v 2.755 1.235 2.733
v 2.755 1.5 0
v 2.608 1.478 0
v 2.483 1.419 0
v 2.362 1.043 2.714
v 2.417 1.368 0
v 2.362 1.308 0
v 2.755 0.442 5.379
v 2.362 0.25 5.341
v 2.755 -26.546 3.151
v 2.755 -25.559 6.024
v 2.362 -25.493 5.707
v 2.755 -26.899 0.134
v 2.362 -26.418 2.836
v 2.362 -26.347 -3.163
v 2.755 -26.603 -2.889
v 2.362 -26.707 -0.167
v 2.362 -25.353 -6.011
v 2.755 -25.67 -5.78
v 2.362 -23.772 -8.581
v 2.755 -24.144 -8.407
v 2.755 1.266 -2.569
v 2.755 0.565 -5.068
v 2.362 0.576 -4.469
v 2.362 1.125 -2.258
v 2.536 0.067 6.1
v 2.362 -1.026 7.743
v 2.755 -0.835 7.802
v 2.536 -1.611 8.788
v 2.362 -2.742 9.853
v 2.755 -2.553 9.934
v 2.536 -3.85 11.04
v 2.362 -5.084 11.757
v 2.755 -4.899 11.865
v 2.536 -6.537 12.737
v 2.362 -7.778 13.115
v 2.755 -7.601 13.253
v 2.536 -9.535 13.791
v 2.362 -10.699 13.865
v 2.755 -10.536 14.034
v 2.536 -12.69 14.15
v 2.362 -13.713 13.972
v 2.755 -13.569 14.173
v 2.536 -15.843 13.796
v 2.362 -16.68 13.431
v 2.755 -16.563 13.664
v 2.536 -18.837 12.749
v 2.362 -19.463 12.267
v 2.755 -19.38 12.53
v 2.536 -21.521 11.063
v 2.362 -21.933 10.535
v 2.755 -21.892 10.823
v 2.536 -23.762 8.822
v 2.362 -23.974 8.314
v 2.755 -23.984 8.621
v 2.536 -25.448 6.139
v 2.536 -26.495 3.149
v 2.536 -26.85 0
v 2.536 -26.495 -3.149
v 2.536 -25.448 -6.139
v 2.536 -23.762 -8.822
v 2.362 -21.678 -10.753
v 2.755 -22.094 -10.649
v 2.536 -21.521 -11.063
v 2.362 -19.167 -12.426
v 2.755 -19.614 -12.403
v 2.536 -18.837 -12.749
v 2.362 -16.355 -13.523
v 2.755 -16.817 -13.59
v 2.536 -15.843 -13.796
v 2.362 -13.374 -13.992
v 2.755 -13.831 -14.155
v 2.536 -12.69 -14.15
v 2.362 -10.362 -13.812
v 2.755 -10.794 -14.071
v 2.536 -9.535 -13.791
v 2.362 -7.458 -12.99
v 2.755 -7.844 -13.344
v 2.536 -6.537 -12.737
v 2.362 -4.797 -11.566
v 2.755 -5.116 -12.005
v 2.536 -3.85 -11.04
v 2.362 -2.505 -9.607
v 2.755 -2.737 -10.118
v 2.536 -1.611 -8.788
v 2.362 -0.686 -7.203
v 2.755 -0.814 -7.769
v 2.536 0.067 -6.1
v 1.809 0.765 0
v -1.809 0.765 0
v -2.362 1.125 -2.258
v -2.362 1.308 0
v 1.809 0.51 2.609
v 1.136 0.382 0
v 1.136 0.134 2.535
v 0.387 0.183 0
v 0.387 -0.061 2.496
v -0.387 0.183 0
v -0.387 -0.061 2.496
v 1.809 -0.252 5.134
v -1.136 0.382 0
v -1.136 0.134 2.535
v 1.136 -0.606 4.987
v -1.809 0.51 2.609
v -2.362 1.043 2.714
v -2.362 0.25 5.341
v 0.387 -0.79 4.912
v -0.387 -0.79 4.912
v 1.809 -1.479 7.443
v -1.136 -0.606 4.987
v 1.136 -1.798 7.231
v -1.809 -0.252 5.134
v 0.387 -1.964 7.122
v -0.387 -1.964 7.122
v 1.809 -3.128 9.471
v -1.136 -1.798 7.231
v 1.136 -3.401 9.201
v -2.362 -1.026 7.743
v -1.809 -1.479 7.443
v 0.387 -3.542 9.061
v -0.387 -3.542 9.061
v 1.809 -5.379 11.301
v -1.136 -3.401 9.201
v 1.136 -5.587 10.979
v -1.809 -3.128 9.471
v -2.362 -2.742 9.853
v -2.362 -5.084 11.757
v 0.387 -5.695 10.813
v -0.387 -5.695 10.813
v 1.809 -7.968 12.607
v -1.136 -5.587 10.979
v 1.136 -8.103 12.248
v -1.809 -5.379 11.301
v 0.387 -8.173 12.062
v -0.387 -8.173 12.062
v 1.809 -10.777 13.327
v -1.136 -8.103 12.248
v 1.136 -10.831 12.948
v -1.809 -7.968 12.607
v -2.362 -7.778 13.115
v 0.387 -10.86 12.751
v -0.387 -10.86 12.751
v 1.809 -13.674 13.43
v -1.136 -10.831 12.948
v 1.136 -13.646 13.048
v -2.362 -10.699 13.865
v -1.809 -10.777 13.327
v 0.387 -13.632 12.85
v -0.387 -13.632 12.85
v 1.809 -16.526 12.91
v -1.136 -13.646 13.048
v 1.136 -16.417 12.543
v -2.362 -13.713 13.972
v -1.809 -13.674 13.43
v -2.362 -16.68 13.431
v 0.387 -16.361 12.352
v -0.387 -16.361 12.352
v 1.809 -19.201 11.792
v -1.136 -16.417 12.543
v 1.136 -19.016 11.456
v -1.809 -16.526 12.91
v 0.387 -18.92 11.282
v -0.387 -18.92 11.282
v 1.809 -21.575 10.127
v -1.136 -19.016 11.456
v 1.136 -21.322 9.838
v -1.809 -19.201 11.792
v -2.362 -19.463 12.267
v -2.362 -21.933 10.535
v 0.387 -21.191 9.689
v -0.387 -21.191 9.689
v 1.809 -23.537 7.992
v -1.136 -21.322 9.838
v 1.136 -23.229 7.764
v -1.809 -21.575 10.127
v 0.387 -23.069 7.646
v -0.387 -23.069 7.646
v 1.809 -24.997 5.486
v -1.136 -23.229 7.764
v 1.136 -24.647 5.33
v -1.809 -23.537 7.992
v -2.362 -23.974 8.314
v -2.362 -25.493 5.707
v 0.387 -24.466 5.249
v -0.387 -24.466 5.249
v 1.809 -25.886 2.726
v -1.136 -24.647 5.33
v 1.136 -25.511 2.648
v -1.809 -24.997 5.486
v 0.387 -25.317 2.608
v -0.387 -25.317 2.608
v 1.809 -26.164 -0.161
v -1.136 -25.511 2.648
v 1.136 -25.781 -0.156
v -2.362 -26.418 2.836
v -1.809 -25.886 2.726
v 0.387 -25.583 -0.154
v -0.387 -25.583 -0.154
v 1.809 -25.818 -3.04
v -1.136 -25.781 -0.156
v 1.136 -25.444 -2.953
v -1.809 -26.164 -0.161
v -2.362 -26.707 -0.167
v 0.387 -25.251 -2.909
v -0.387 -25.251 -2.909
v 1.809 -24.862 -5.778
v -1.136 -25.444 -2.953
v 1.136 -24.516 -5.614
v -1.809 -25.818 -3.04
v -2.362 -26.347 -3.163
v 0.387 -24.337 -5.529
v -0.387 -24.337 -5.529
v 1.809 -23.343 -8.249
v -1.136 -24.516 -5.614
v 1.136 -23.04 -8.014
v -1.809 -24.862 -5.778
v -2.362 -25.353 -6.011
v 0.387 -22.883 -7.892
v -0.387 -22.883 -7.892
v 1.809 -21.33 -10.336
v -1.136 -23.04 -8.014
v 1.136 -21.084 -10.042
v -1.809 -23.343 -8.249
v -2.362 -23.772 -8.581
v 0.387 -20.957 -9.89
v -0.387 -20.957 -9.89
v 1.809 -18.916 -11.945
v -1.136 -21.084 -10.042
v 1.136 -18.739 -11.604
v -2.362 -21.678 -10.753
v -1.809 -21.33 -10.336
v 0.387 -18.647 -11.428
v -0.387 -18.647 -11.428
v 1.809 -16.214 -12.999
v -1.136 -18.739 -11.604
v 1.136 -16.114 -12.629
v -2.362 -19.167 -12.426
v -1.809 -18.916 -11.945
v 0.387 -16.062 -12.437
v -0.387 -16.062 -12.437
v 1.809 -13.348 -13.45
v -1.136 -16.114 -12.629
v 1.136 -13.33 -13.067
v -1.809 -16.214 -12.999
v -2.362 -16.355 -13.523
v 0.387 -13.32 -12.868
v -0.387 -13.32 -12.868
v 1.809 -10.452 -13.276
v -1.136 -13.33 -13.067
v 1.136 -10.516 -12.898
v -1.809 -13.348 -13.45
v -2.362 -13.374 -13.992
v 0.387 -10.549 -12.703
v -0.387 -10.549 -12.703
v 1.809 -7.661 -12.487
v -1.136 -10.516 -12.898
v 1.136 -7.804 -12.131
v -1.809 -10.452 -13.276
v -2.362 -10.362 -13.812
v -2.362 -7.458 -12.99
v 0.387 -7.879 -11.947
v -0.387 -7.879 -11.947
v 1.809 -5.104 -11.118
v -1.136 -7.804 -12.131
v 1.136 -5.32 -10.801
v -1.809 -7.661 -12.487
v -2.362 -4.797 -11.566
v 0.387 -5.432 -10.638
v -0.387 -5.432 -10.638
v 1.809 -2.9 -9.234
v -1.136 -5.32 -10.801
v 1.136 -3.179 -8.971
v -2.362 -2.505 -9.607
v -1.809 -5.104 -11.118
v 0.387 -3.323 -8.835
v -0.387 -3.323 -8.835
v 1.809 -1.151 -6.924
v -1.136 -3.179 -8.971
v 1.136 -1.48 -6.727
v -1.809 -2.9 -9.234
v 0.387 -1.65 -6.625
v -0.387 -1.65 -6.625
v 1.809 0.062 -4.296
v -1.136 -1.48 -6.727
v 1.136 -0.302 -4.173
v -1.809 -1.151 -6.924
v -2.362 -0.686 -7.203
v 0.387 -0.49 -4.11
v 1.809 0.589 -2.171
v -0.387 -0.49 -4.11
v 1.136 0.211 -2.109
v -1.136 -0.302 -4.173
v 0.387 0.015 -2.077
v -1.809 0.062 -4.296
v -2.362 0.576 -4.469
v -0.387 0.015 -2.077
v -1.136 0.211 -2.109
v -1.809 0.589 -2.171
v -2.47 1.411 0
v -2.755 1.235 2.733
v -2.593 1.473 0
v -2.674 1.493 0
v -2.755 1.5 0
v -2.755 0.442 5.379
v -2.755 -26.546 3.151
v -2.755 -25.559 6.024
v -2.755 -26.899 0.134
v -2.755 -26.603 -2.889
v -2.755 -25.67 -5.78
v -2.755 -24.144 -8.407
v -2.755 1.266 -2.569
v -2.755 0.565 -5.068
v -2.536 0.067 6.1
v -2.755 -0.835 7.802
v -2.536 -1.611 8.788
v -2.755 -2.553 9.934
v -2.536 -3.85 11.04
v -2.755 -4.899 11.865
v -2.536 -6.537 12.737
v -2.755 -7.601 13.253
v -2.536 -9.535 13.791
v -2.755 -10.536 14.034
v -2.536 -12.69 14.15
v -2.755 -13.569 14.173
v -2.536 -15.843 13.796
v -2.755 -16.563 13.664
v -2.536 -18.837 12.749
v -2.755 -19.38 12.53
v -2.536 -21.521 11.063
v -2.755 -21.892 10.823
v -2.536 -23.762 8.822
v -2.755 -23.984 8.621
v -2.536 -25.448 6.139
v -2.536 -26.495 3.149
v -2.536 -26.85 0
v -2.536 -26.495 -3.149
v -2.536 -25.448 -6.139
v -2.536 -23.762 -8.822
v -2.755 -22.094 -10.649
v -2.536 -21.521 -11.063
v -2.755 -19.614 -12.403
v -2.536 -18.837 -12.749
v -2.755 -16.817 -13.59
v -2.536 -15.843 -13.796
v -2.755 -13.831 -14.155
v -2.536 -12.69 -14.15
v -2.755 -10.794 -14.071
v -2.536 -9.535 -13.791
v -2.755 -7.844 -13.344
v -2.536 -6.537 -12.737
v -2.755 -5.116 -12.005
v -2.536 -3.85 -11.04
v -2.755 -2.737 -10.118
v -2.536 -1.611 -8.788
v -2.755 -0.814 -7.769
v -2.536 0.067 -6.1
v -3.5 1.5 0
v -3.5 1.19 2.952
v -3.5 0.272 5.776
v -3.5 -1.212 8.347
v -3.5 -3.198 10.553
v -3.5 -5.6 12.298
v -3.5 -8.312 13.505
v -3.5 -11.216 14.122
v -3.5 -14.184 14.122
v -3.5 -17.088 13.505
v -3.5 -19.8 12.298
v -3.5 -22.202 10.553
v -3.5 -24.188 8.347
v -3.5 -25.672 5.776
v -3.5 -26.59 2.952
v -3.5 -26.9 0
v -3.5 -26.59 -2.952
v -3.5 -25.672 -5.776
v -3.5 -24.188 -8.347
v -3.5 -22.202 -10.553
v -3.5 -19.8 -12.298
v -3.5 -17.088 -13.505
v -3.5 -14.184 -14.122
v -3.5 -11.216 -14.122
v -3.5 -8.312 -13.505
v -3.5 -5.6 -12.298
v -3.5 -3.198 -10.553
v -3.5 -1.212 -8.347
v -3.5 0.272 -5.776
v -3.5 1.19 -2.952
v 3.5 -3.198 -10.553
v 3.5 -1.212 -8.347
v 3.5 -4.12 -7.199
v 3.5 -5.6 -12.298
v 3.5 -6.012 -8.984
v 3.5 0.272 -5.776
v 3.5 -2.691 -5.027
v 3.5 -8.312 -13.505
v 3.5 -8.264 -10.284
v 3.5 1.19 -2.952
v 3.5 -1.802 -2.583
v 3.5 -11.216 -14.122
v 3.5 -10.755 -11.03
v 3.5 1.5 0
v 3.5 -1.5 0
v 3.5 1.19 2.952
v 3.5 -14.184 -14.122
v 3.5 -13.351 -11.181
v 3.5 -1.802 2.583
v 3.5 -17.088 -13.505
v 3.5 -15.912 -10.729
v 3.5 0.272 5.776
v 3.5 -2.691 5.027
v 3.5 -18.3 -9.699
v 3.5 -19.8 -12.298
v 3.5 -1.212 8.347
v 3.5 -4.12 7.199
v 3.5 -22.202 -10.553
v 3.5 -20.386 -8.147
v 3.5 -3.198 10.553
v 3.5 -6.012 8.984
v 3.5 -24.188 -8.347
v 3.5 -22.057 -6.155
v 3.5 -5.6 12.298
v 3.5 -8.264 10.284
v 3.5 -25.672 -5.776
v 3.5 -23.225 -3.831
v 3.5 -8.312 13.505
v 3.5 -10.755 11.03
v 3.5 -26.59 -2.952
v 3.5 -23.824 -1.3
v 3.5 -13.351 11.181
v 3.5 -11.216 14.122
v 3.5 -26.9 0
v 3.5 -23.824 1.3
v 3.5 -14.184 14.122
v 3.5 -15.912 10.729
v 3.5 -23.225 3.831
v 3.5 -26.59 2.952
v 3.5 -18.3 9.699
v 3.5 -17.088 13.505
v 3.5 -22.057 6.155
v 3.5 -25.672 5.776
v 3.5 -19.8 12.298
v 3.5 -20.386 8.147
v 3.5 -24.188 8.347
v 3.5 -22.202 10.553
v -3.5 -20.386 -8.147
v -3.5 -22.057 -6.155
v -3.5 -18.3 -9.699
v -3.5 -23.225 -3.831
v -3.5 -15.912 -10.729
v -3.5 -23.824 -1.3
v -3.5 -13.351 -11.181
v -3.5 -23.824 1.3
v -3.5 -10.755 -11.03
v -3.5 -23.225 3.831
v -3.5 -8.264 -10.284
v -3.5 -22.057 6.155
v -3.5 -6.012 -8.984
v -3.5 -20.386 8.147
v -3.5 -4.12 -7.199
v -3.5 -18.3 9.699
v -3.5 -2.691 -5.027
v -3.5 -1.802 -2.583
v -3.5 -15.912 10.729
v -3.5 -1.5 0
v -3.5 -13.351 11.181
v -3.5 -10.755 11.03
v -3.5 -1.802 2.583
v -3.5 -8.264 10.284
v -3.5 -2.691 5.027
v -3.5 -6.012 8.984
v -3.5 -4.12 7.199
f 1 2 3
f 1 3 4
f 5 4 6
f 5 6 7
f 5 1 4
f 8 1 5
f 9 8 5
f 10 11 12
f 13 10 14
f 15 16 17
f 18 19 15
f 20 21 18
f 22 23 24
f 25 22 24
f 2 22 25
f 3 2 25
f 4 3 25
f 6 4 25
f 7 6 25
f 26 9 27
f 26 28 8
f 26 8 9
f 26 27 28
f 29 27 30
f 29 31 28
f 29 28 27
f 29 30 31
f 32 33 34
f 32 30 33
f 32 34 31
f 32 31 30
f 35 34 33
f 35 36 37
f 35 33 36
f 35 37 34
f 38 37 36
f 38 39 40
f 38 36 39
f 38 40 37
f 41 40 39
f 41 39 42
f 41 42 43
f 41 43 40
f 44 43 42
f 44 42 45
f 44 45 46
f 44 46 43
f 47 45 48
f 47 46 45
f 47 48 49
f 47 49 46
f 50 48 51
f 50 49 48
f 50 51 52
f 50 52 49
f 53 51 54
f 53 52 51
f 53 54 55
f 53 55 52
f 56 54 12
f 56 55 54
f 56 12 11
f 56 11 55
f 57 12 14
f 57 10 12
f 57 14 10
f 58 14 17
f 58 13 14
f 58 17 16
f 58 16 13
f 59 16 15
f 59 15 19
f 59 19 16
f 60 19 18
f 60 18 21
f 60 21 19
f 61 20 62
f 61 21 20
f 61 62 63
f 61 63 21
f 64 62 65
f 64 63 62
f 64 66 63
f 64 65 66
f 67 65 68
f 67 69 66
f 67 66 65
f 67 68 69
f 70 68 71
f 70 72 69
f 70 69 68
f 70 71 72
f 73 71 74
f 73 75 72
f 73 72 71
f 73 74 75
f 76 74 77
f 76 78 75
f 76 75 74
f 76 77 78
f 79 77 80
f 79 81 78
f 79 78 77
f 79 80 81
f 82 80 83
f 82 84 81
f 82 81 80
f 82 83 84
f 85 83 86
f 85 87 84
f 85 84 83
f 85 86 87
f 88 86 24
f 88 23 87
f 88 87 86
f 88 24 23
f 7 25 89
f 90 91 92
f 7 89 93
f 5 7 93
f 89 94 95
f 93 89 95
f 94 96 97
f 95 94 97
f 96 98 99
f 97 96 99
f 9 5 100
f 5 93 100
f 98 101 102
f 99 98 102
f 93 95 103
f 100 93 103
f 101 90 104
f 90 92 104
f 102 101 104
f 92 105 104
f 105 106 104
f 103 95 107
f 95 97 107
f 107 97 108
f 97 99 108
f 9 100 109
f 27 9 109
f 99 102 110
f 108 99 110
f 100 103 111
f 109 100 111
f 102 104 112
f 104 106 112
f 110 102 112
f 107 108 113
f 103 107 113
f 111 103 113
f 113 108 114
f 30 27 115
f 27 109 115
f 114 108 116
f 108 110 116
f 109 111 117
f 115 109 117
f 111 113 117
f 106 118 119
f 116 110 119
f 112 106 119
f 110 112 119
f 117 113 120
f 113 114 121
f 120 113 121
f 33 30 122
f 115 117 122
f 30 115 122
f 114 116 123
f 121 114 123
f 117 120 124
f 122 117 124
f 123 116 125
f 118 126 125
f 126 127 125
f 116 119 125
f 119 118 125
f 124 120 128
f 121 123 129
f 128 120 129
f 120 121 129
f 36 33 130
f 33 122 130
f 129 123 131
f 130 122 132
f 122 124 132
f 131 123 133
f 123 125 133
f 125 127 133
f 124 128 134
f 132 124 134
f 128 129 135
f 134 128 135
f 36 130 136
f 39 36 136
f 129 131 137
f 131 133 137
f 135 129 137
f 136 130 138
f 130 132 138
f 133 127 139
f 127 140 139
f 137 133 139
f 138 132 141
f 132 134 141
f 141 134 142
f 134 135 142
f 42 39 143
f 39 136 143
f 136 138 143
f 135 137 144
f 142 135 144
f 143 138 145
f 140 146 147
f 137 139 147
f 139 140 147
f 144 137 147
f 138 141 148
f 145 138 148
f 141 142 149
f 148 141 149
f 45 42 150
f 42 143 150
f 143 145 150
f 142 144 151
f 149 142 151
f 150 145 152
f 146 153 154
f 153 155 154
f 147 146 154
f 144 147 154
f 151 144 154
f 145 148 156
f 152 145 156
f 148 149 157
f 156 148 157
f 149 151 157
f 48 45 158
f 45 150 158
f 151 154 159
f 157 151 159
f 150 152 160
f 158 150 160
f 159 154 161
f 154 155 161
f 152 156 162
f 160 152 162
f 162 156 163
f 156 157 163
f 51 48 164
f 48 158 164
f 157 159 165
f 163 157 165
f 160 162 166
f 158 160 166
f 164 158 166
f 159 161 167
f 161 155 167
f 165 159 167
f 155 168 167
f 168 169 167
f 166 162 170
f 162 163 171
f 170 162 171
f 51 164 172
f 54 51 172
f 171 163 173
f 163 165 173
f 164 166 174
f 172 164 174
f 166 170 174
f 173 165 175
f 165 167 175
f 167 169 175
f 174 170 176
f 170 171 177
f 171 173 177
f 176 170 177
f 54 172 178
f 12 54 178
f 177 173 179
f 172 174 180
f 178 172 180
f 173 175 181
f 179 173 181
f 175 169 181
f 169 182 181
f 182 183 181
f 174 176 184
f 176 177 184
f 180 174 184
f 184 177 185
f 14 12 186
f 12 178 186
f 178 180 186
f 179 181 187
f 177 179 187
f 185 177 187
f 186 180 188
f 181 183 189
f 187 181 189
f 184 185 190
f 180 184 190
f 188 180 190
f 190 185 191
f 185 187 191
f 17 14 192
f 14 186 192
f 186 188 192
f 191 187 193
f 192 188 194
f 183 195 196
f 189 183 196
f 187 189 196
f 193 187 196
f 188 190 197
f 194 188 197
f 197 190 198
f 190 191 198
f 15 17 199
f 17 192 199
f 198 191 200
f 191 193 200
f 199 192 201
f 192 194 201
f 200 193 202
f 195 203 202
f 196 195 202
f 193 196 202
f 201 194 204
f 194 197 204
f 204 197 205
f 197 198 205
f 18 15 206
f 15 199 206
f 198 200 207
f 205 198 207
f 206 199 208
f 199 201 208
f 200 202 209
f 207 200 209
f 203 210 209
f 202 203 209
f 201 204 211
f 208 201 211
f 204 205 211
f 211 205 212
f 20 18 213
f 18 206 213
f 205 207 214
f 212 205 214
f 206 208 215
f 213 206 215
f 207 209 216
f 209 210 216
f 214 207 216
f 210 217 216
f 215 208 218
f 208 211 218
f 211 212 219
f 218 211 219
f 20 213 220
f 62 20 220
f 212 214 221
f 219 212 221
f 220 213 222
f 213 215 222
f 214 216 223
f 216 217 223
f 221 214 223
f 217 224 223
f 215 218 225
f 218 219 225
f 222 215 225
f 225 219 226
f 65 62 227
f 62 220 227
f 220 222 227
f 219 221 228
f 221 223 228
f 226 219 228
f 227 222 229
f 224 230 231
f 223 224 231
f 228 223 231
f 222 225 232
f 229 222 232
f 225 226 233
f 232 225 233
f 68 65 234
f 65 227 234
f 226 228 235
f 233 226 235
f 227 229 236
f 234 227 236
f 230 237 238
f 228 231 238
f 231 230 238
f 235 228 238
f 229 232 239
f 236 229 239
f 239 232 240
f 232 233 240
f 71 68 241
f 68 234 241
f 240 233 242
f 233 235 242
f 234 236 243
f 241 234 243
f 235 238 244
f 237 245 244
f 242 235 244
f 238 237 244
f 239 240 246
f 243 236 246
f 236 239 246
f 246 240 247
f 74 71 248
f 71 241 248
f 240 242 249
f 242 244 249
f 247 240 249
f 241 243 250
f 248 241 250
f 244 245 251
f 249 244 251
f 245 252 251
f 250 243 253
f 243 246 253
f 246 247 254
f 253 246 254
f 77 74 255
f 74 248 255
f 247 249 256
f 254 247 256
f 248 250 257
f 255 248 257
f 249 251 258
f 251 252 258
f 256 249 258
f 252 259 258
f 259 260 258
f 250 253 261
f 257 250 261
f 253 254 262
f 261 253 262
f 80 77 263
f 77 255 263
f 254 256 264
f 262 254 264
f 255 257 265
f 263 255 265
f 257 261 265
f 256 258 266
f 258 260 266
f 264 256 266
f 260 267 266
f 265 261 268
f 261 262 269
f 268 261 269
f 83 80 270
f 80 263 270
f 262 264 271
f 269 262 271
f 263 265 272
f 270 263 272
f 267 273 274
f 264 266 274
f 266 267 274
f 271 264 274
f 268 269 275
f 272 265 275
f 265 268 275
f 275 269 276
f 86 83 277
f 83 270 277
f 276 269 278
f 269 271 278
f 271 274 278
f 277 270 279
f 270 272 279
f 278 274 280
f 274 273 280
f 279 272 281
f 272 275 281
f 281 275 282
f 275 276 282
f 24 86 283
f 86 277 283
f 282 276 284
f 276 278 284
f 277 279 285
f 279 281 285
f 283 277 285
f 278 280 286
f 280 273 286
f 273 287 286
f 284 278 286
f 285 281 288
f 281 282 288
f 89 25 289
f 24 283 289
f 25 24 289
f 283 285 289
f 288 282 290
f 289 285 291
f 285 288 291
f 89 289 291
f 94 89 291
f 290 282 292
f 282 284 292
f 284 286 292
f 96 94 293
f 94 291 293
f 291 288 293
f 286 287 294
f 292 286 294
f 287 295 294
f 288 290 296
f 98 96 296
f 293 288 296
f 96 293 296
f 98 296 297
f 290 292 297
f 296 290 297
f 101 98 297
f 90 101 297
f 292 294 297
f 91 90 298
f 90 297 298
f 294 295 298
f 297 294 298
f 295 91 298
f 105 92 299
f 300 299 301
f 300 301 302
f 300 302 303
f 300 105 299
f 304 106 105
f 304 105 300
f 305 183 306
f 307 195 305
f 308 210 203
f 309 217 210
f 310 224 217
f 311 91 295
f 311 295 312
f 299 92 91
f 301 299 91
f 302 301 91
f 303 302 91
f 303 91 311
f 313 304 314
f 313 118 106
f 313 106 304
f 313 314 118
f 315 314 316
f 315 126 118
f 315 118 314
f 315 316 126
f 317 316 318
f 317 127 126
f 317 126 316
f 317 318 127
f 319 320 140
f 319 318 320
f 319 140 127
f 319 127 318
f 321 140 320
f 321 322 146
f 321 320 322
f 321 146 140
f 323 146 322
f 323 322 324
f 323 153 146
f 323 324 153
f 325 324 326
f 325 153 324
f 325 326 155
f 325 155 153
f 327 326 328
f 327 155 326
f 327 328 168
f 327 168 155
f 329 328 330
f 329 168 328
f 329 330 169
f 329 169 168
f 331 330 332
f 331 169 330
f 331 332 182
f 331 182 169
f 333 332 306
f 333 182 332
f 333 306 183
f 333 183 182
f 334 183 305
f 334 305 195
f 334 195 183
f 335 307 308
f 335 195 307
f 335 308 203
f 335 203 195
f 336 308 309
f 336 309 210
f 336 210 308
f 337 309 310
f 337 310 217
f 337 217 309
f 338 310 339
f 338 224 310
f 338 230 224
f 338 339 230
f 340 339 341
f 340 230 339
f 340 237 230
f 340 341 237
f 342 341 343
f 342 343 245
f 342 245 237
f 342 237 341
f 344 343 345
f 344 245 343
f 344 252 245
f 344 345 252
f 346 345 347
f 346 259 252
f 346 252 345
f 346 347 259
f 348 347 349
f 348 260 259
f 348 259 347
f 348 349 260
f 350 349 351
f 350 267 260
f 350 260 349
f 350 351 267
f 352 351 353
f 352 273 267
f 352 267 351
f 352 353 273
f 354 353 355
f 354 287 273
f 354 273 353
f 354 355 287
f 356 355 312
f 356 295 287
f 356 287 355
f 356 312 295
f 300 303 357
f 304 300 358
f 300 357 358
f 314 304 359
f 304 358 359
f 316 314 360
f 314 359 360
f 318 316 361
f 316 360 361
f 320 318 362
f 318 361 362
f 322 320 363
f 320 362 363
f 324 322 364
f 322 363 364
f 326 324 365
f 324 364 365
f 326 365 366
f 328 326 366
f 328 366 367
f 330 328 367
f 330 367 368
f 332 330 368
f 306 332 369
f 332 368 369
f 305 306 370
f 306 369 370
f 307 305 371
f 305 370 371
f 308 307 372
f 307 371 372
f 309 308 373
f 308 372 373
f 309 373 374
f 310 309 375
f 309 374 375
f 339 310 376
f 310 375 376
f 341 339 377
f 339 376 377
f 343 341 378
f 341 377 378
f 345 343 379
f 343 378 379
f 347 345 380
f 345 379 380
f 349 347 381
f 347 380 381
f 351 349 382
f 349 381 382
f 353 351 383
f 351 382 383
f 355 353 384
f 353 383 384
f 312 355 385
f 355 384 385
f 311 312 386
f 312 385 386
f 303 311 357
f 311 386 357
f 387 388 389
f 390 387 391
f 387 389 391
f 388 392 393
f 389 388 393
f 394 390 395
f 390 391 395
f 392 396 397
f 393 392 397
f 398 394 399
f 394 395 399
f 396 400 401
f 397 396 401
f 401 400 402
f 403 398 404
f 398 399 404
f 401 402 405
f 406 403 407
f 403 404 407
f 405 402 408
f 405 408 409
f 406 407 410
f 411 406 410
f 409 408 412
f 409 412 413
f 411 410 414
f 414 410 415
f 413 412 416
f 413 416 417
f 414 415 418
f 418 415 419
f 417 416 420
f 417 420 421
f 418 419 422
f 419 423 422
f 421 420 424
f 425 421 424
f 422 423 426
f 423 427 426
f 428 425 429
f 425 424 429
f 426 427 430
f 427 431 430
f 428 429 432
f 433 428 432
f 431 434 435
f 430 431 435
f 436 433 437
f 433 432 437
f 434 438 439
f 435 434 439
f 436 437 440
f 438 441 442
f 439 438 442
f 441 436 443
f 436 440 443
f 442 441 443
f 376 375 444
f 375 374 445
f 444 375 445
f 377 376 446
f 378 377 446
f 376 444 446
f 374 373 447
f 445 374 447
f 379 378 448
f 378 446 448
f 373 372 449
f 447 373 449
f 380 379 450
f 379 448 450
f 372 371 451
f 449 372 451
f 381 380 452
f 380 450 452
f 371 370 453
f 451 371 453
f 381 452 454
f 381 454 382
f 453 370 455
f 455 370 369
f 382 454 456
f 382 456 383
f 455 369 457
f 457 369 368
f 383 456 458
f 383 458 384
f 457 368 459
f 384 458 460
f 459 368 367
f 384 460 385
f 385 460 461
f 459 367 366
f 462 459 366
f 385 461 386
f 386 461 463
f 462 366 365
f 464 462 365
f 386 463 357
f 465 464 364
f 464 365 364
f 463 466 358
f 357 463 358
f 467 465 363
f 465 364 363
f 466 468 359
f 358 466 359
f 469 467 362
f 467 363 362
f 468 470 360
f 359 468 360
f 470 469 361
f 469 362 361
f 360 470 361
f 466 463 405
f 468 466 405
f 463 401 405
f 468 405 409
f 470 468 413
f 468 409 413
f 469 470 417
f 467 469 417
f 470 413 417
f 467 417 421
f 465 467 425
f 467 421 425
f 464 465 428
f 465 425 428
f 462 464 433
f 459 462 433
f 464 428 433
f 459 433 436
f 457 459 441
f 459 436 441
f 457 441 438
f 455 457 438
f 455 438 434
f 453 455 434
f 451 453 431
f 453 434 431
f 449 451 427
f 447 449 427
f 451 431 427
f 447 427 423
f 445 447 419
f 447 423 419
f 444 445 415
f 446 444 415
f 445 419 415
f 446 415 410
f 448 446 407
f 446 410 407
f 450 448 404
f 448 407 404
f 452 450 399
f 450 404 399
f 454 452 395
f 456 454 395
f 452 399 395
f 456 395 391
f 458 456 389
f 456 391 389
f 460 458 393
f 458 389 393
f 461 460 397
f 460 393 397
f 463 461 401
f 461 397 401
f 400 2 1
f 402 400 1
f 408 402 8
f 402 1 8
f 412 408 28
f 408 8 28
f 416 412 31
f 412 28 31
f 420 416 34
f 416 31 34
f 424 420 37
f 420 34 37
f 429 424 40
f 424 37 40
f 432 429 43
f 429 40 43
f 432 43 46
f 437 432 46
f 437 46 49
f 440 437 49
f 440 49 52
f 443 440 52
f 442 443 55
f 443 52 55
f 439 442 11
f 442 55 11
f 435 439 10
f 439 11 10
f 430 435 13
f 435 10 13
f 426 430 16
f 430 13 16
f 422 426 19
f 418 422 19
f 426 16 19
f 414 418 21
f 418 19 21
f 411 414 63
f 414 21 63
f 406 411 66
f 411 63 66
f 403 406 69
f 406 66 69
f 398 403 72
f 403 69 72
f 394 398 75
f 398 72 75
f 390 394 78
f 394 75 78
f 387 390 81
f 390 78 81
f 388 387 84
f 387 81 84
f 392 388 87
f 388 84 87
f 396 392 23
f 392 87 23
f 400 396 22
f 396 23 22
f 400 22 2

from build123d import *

# Parameters (mm, degrees)
F2_R = 0.5


with BuildPart() as f1:
    # F0 (on Top) → F1 (revolve)
    with BuildSketch(Plane.XY):
        with BuildLine():
            Line((-3.5, -1.5), (3.5, -1.5))
            Line((3.5, -1.5), (3.5, 1.5))
            Line((3.5, 1.5), (2.5, 1.5))
            ThreePointArc((2.5, 1.5), (0, 0.1583123952), (-2.5, 1.5))
            Line((-2.5, 1.5), (-3.5, 1.5))
            Line((-3.5, 1.5), (-3.5, -1.5))
        make_face()
    revolve(axis=Axis((0, -12.7, 0), (1, 0, 0)))

    # F2
    f2_edges = [f1.edges().sort_by_distance(p)[0] for p in [
        (-2.5, -26.9, 0),
        (2.5, -26.9, 0),
    ]]
    fillet(f2_edges, radius=F2_R)


solid = f1.part
